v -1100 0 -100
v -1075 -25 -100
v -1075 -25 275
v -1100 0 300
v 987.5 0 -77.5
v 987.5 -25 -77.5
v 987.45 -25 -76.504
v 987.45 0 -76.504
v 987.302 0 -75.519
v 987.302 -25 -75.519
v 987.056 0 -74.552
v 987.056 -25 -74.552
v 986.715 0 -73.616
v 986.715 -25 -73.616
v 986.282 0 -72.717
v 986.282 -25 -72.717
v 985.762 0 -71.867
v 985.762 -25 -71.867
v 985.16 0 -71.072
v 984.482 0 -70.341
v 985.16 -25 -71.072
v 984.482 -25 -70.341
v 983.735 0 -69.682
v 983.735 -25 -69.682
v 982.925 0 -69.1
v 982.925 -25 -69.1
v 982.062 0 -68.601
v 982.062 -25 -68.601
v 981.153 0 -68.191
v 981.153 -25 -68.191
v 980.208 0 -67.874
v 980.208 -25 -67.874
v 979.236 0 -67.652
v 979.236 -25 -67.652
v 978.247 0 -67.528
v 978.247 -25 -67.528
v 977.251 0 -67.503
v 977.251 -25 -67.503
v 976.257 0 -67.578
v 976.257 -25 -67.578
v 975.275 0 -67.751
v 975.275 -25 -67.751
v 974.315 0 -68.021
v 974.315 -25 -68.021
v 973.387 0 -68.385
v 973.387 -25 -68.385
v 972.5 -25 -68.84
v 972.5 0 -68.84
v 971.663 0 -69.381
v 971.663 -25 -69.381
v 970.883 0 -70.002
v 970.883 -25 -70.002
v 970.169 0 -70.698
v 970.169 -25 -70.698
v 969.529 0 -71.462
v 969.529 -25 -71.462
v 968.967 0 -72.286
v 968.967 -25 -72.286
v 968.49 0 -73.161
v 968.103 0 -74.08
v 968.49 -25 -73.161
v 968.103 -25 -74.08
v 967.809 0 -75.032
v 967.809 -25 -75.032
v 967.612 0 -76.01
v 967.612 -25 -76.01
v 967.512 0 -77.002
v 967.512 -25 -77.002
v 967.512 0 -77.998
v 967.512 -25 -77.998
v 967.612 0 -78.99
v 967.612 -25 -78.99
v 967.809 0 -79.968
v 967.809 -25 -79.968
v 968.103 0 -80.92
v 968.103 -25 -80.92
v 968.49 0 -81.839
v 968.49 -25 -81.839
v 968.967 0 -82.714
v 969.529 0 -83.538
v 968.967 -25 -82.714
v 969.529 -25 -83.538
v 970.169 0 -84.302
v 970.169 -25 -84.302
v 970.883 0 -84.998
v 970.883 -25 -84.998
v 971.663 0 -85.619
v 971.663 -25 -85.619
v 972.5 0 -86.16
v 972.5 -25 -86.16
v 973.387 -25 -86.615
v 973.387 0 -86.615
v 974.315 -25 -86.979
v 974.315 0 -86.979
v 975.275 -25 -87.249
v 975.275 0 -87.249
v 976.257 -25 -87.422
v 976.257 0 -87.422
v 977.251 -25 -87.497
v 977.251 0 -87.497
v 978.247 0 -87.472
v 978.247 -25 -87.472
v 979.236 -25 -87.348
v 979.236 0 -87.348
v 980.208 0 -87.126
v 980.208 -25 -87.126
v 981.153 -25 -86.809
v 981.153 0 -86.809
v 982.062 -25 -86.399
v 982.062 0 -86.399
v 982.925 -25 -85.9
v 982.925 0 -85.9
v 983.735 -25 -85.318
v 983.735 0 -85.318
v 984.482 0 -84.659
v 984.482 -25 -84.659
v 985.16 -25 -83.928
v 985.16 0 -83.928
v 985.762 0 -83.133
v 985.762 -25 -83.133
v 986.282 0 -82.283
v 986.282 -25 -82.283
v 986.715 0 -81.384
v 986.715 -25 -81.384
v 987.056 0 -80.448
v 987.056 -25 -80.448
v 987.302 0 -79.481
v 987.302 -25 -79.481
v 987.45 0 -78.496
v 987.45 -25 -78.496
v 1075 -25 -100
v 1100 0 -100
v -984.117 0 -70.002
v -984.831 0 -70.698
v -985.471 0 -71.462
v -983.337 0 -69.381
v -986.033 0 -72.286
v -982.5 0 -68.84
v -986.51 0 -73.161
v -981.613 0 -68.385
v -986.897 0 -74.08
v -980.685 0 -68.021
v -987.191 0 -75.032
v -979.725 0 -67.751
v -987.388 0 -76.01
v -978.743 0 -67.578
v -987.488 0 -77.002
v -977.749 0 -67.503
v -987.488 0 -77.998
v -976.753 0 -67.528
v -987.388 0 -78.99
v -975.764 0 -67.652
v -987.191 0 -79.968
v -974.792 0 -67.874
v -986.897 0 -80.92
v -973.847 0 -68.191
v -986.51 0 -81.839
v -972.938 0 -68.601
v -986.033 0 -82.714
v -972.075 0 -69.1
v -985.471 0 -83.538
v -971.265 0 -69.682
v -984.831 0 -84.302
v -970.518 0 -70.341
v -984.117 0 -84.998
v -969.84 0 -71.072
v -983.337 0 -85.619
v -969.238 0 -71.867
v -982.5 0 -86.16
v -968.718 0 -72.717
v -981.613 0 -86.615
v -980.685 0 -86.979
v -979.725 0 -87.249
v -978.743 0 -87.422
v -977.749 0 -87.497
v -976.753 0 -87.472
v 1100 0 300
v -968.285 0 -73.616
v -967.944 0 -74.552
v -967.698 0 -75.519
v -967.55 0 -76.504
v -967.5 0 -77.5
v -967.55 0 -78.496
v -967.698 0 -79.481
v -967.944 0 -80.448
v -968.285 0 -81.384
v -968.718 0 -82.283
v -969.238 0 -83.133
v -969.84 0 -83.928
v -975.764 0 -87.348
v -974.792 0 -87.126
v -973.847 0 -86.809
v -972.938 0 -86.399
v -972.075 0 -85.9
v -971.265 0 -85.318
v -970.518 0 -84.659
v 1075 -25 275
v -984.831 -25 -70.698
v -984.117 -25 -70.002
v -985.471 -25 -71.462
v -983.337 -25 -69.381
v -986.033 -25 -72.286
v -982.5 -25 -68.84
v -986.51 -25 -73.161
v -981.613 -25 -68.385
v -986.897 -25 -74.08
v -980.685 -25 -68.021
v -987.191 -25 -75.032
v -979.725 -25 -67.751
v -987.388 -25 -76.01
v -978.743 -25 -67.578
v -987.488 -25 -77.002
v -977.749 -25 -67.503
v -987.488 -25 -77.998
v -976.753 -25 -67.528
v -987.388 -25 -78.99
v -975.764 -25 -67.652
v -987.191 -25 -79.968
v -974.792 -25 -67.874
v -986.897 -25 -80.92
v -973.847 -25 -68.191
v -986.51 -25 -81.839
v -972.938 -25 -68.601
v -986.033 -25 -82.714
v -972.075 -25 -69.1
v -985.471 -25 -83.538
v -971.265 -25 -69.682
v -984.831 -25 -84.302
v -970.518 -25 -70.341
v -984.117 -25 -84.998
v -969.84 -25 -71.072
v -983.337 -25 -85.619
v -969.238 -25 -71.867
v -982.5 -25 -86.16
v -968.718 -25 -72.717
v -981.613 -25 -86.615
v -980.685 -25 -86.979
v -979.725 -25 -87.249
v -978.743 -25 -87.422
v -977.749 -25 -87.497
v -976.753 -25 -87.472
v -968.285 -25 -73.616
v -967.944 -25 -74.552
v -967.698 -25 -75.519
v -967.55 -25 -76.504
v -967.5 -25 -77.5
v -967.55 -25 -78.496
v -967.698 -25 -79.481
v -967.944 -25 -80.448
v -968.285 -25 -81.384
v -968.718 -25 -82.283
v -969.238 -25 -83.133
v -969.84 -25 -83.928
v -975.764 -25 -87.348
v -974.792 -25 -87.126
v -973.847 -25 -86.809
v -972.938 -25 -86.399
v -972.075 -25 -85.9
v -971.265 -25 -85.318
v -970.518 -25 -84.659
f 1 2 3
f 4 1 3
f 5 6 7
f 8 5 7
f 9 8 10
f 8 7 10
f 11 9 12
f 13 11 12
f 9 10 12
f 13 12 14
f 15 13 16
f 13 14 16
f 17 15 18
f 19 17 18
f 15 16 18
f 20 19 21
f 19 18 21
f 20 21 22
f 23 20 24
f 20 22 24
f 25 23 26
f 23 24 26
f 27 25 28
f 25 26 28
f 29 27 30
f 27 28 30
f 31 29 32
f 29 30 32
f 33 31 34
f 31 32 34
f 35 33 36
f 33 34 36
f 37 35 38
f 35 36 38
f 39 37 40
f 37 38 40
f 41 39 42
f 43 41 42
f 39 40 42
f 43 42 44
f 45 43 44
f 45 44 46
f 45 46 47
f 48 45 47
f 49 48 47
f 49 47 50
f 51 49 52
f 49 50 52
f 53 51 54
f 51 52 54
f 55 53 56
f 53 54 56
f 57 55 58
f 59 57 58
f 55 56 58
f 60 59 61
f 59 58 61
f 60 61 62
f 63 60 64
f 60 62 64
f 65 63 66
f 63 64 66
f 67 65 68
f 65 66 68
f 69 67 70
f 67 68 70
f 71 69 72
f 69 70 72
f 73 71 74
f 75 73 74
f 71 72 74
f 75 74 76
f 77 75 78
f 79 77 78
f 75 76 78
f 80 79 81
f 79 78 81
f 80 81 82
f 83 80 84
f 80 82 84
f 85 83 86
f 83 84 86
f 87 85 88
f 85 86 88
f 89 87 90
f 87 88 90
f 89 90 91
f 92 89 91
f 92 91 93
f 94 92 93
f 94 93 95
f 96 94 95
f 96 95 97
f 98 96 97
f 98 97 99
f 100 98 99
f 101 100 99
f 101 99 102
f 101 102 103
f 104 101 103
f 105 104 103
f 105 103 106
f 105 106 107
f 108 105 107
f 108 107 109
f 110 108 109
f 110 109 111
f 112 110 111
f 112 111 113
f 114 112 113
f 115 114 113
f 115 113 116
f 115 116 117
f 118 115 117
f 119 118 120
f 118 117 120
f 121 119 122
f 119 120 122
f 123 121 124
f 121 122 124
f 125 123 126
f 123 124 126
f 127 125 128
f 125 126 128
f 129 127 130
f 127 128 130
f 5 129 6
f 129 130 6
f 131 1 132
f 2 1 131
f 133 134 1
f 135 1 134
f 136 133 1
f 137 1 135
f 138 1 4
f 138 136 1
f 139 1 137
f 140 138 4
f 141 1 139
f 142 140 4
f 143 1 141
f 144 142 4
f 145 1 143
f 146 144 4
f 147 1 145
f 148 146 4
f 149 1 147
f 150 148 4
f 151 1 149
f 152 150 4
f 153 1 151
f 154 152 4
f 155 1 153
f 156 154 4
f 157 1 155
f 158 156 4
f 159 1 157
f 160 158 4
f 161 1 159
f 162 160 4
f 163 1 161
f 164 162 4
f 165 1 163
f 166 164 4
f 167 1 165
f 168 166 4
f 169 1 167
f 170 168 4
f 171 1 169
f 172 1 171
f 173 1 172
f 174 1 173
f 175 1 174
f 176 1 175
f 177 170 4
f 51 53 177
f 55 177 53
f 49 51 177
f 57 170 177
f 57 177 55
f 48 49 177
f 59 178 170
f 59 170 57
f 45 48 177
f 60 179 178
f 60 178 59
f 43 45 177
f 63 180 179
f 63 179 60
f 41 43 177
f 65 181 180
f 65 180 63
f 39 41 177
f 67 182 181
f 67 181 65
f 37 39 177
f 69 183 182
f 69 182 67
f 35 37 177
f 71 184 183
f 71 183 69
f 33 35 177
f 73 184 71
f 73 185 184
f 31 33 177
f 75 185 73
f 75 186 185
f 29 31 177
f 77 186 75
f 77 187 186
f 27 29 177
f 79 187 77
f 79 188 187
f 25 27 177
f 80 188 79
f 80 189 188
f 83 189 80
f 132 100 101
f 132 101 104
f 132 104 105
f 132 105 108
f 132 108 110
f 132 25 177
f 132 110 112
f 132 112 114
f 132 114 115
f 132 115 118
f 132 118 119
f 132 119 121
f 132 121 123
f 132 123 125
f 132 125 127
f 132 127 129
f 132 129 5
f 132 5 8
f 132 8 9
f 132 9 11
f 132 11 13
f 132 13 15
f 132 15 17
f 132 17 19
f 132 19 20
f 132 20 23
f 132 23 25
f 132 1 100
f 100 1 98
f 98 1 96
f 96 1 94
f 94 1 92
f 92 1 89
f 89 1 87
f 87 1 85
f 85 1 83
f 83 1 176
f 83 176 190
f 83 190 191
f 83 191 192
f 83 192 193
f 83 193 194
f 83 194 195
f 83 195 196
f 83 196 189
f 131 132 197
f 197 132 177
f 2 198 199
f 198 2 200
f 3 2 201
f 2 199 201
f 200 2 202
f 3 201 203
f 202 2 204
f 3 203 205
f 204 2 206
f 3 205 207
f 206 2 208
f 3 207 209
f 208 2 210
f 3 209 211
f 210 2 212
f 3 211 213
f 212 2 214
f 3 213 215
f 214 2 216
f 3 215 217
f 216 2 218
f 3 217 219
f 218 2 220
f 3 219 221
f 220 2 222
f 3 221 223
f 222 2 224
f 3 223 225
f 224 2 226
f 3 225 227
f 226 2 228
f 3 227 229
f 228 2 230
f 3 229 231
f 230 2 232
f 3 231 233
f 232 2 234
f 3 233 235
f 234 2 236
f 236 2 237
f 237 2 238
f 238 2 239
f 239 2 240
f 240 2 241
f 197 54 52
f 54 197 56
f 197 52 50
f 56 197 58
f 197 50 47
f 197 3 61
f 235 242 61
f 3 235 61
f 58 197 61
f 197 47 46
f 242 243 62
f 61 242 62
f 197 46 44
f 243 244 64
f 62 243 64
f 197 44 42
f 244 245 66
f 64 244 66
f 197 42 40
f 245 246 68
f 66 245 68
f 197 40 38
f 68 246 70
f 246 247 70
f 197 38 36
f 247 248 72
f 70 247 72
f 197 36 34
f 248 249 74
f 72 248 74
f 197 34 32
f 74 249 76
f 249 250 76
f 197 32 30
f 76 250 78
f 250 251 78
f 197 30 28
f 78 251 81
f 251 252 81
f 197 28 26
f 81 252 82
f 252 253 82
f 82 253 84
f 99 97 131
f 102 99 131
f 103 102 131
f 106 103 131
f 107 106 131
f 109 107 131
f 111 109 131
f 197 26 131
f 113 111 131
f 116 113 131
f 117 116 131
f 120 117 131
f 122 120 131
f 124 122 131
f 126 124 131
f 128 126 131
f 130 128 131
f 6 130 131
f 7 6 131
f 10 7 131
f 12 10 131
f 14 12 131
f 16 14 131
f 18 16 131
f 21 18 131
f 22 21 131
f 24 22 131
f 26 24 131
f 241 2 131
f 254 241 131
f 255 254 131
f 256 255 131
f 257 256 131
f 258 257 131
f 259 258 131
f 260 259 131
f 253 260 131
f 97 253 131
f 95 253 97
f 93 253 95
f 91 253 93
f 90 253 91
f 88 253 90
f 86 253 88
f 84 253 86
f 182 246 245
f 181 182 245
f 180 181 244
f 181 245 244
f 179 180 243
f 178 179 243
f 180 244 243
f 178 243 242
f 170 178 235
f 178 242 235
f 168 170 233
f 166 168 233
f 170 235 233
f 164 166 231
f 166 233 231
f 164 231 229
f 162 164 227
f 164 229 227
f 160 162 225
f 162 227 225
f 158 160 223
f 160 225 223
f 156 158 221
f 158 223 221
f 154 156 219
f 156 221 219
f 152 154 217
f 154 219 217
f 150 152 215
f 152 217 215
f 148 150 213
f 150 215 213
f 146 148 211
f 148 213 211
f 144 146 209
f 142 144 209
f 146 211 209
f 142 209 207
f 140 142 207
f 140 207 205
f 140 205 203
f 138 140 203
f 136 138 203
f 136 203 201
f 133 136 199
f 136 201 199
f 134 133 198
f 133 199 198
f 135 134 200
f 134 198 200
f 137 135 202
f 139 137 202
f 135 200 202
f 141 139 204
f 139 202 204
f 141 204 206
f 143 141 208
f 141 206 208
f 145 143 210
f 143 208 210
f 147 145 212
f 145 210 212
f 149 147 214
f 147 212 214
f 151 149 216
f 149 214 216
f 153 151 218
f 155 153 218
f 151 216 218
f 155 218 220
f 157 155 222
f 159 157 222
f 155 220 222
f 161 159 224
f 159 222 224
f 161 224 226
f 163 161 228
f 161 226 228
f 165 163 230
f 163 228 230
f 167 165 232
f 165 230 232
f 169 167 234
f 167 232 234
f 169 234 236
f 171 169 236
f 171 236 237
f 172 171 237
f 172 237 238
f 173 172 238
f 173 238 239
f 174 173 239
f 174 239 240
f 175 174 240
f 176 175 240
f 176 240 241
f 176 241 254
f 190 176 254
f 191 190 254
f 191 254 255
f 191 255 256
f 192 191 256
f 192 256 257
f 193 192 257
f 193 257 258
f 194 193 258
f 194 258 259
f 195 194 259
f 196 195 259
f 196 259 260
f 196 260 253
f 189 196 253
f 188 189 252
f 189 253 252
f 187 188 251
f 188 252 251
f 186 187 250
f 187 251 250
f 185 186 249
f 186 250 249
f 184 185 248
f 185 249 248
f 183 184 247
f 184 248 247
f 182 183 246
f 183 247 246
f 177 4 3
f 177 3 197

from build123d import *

# Parameters (mm, degrees)
F0_W     = 2200
F0_H     = 400
F1_DEPTH = 25
F2_R     = 10
F3_DEPTH = 25
F4_R     = 10
F5_DEPTH = 25
F6_DEPTH = 100
F7_DEPTH = 100
F8_SIZE  = 24.99999


# Not quite as in the source:
# - a fillet or chamfer is up to 0.001 mm smaller than in the source, because OpenCascade refuses the exact size


with BuildPart() as f1:
    # F0 (on Front) → F1 (new body)
    with BuildSketch(Plane.XZ):
        Rectangle(F0_W, F0_H)
    extrude(amount=F1_DEPTH)

    # F2 (on face) → F3 (cut)
    with BuildSketch(Plane.XZ.offset(25)):
        with Locations((977.5, -77.5)):
            Circle(F2_R)
    extrude(amount=-F3_DEPTH, mode=Mode.SUBTRACT)

    # F4 (on face) → F5 (cut)
    with BuildSketch(Plane.XZ.offset(25)):
        with Locations((-977.5, -77.5)):
            Circle(F4_R)
    extrude(amount=-F5_DEPTH, mode=Mode.SUBTRACT)

    # F6 (add): a face of the model
    f6_faces = [f1.faces().sort_by_distance(p)[0] for p in [
        (0, -12.5, 200),
    ]]
    extrude(f6_faces, amount=F6_DEPTH)

    # F7 (cut): a face of the model
    f7_faces = [f1.faces().sort_by_distance(p)[0] for p in [
        (0, -12.5, -200),
    ]]
    extrude(f7_faces, amount=-F7_DEPTH, mode=Mode.SUBTRACT)

    # F8 (size 25 in the source; OpenCascade refuses exactly that, so slightly less here)
    f8_edges = [f1.edges().sort_by_distance(p)[0] for p in [
        (-1100, -25, 100),
        (0, -25, 300),
        (1100, -25, 100),
    ]]
    chamfer(f8_edges, length=F8_SIZE)


solid = f1.part
